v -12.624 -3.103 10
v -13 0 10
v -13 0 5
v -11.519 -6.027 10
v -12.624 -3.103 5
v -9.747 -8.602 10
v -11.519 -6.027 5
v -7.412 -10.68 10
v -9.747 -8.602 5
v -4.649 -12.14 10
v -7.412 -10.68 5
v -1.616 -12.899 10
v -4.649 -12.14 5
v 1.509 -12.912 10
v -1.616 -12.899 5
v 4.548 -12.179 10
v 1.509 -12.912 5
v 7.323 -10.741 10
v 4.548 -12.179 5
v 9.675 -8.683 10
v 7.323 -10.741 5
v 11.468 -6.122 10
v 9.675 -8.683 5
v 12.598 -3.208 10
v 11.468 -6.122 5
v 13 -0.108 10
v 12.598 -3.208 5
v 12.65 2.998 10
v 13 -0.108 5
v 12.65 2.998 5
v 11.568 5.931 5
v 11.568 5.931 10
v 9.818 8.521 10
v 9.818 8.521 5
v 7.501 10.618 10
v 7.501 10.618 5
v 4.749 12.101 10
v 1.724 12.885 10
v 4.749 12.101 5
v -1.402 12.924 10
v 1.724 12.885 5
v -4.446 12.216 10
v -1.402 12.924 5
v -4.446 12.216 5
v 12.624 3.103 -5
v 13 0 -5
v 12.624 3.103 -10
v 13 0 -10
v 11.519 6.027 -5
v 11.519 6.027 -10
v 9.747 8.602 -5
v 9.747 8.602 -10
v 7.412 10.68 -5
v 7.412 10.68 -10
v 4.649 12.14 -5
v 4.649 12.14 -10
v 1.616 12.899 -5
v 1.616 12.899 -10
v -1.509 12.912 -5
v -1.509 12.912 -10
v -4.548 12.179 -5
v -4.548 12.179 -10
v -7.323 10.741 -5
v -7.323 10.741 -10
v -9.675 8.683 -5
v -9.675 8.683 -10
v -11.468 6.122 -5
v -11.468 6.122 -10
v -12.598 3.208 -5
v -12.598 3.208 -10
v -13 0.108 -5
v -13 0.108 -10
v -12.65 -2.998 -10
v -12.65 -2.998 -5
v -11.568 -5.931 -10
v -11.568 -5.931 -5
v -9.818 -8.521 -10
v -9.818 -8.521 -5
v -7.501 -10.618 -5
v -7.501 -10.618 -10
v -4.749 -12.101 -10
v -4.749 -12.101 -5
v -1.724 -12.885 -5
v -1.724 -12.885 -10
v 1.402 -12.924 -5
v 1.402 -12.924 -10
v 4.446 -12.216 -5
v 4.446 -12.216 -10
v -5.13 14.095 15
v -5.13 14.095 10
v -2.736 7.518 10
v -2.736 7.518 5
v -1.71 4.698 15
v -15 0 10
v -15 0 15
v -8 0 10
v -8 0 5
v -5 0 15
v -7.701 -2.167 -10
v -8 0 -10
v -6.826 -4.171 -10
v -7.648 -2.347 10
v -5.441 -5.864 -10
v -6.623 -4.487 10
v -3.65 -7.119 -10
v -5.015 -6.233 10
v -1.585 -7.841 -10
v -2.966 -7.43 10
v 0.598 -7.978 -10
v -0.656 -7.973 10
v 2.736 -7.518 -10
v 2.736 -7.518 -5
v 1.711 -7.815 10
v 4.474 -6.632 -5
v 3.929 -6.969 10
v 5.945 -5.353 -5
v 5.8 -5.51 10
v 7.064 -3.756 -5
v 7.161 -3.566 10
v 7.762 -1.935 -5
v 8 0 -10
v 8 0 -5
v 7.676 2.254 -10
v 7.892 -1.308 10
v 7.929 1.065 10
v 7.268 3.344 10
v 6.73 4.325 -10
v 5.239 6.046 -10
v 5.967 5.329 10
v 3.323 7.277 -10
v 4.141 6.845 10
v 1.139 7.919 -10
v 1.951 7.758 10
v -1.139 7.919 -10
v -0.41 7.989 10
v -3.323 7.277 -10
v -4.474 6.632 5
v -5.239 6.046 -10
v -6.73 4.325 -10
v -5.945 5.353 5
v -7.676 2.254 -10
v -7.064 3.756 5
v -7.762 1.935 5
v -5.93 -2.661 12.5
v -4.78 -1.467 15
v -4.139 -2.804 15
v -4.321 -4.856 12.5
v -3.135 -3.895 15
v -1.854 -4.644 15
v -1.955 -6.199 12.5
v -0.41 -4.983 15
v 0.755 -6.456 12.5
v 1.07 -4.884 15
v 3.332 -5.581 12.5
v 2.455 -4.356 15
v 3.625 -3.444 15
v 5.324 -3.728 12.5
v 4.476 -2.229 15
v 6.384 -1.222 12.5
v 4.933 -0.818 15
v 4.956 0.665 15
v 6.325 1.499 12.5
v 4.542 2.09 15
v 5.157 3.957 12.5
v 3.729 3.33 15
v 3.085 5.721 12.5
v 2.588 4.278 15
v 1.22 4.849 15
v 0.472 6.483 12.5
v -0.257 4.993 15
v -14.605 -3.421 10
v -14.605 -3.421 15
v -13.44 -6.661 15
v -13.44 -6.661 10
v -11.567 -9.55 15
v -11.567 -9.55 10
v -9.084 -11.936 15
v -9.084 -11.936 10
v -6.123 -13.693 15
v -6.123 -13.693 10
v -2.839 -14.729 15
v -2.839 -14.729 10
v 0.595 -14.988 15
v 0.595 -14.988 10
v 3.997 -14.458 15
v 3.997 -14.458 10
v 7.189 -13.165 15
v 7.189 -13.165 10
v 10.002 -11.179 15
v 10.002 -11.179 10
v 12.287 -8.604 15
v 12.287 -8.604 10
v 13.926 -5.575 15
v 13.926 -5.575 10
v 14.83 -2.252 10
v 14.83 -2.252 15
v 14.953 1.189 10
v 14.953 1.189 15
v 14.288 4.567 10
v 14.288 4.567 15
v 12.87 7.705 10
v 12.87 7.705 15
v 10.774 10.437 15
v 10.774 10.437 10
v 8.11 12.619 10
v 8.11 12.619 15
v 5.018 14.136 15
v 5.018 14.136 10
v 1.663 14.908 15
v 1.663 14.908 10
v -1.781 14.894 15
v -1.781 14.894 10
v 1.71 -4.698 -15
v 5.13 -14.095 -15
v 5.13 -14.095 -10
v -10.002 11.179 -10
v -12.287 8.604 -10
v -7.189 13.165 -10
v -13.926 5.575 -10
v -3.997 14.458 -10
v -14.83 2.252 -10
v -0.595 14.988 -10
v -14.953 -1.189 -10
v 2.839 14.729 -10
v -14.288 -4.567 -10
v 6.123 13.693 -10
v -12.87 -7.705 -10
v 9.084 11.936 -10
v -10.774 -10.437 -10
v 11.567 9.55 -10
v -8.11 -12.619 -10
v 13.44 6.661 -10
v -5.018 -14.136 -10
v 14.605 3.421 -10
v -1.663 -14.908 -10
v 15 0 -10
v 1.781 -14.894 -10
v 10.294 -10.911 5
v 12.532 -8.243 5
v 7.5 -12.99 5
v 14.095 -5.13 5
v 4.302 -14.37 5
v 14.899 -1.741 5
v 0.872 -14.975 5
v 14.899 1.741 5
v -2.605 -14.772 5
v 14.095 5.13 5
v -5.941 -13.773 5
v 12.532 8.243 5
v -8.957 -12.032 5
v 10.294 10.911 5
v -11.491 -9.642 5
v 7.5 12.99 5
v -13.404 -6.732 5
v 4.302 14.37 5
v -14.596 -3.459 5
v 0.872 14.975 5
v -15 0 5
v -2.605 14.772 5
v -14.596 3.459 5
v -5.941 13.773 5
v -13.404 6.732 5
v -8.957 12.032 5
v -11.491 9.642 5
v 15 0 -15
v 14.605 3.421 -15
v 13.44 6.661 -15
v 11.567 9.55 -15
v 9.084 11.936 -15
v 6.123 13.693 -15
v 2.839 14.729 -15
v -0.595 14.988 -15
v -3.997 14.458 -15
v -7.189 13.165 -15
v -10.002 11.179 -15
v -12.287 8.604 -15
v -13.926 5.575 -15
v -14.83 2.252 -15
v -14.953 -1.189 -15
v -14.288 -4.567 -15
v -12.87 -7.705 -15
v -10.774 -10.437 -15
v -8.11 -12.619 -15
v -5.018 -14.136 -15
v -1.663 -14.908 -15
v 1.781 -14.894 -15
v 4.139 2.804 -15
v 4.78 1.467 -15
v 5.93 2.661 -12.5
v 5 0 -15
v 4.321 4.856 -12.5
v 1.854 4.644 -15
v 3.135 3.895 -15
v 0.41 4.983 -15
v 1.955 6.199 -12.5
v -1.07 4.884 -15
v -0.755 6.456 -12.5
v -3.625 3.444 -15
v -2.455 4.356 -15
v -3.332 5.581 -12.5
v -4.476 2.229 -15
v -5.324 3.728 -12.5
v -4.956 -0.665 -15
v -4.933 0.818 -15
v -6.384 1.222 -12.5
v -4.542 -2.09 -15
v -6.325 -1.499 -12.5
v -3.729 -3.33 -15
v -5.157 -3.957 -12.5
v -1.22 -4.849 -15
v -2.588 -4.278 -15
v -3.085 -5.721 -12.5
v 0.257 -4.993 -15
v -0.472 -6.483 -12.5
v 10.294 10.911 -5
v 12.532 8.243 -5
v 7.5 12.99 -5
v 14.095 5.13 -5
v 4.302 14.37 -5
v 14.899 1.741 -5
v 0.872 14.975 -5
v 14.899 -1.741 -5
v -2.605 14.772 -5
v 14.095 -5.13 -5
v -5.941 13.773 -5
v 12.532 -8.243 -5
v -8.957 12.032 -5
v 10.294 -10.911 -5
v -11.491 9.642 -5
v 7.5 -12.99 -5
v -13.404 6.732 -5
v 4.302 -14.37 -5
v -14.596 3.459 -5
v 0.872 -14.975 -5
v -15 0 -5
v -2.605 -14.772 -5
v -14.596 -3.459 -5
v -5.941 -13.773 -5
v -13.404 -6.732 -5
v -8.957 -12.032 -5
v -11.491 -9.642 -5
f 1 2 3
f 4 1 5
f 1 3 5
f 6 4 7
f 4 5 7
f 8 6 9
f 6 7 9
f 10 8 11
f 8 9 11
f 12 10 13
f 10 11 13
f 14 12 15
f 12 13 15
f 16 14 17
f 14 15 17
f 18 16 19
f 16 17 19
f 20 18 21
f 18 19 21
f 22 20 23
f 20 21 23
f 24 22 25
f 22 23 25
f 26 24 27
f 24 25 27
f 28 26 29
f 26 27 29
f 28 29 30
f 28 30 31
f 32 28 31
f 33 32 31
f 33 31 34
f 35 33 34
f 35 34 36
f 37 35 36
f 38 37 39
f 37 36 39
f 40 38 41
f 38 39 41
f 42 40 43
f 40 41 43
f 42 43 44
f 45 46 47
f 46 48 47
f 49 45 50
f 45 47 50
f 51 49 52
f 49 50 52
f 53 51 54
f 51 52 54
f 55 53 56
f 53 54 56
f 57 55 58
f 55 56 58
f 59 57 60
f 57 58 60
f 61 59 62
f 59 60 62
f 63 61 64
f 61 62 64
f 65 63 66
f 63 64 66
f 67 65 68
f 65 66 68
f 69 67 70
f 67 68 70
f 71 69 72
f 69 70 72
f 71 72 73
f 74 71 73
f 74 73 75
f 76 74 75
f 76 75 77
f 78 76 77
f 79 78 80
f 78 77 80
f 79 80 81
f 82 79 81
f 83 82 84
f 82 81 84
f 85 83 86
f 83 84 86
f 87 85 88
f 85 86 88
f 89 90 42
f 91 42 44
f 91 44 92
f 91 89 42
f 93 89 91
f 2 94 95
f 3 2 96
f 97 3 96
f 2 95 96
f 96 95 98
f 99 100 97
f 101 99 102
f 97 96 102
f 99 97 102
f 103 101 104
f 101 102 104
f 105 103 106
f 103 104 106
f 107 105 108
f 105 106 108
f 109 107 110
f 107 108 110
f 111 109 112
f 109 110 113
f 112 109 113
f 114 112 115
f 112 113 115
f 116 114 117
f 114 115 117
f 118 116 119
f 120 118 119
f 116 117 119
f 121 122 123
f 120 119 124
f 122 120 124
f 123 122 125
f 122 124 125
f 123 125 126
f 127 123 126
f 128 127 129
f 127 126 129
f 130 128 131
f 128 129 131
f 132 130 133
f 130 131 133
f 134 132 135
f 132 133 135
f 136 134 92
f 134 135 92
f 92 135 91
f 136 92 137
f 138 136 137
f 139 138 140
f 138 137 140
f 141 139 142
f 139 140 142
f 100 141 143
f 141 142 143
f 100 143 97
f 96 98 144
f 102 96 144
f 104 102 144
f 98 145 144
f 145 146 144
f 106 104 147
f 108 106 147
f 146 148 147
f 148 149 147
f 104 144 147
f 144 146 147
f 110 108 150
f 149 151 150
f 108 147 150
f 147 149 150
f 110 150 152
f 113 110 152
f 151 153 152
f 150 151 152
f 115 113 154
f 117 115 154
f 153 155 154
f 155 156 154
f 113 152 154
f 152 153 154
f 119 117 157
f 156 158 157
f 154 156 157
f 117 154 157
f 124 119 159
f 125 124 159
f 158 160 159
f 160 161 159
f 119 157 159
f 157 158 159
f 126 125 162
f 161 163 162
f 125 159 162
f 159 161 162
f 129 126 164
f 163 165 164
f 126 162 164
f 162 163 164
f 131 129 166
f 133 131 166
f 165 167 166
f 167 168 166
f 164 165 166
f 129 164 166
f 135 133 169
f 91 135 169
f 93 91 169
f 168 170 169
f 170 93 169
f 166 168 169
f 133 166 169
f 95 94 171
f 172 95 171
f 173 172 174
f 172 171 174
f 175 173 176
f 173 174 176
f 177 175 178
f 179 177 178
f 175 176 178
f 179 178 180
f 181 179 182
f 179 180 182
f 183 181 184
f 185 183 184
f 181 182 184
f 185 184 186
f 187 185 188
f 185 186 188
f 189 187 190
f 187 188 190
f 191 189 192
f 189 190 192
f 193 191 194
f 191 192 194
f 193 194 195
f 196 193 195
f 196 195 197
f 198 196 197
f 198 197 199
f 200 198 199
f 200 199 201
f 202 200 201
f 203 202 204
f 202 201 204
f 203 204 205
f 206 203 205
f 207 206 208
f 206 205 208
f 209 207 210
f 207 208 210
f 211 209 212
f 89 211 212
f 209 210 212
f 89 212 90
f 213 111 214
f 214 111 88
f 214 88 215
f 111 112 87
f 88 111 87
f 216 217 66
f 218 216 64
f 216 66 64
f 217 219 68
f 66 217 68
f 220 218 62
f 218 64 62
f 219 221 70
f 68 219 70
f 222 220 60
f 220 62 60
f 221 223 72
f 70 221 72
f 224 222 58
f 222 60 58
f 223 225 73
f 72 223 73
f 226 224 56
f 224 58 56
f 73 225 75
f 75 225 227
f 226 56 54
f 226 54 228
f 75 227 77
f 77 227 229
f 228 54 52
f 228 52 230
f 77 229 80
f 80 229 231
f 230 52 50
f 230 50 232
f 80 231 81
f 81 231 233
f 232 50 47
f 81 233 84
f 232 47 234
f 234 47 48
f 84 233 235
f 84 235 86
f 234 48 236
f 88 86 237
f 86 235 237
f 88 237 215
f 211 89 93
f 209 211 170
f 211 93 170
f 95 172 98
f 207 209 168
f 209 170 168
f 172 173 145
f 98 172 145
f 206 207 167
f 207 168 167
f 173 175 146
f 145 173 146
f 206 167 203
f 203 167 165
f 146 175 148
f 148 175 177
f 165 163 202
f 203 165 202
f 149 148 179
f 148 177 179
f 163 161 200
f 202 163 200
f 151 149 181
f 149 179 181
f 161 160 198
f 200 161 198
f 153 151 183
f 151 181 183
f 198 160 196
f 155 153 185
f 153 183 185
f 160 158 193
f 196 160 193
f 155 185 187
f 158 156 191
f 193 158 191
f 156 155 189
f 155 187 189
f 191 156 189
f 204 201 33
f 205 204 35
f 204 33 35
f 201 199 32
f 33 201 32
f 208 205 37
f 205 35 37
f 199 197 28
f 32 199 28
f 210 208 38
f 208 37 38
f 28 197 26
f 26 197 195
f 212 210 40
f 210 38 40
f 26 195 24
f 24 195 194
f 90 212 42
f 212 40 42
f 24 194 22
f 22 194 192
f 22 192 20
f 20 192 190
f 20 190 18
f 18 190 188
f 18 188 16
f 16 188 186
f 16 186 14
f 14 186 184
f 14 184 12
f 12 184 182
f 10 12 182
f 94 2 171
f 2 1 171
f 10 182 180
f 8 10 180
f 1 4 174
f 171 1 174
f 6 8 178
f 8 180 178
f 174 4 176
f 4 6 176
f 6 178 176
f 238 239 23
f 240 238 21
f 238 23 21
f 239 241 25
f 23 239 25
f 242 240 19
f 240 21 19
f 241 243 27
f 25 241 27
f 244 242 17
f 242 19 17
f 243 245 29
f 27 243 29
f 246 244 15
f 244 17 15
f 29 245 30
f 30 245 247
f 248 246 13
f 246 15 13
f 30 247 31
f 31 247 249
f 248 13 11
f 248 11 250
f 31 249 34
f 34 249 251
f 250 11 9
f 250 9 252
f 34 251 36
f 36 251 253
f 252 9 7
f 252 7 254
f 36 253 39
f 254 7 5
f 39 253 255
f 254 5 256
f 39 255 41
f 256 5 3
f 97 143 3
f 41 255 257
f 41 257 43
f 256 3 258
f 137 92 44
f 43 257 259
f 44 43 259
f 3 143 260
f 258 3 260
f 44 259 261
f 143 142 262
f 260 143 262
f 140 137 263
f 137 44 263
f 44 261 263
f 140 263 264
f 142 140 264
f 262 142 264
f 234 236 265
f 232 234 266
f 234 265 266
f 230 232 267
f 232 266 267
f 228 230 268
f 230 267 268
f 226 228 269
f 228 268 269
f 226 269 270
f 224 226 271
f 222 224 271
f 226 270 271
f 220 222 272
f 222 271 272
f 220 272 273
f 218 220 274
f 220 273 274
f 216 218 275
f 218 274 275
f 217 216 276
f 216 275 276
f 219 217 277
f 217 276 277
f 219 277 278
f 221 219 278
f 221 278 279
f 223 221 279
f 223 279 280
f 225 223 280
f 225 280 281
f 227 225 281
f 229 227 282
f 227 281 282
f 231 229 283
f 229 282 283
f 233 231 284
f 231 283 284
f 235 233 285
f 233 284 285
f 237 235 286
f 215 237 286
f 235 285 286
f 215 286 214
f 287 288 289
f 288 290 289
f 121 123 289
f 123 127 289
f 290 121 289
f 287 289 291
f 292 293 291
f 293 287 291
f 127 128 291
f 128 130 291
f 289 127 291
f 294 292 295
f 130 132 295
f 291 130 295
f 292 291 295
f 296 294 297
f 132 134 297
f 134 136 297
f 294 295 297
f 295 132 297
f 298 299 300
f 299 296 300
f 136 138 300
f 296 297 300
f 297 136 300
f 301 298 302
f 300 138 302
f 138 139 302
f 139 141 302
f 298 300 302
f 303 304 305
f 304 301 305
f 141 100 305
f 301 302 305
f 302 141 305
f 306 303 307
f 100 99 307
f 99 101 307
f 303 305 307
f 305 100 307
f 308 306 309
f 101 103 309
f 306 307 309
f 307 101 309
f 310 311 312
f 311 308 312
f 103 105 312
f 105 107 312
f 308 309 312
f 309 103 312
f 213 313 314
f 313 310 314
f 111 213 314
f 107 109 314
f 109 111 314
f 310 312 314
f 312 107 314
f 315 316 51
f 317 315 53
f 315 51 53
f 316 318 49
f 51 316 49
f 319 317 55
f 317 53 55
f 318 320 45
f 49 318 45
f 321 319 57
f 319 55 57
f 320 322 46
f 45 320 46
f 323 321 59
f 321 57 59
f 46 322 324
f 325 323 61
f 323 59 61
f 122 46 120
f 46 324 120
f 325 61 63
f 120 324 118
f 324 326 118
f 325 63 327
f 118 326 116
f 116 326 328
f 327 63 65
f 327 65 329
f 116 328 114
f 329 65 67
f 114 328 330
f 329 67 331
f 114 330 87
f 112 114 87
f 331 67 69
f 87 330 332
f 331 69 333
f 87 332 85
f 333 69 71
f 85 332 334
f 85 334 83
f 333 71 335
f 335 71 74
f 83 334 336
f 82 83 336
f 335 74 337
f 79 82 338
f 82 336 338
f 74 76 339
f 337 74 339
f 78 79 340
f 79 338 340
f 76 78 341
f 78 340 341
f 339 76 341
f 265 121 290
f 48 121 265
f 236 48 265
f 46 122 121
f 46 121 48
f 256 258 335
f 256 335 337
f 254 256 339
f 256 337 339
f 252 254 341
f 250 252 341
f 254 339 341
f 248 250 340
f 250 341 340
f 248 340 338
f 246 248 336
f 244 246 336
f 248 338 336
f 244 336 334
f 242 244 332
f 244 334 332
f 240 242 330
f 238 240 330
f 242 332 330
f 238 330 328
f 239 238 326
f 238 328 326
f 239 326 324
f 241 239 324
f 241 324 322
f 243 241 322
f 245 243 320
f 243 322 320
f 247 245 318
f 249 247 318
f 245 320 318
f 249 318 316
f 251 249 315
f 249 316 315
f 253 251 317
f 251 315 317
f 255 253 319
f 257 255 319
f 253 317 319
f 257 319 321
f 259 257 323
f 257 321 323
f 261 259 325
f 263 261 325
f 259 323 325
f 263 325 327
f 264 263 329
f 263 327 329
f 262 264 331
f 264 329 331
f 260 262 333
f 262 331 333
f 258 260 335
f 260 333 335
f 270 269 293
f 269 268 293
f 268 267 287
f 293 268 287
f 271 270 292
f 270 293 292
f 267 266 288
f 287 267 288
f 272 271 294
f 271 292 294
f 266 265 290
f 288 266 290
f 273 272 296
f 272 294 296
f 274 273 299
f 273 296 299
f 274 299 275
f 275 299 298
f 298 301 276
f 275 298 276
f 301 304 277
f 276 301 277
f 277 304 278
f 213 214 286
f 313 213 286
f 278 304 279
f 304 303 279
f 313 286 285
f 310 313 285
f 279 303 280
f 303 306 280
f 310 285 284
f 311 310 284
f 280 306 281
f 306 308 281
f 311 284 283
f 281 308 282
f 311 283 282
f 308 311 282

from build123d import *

# Parameters (mm, degrees)
SKETCH001_W  = 16
SKETCH001_H  = 16
GROOVE_ANGLE = -70


with BuildPart() as part:
    # Sketch (on XZ_Plane of Origin) → Revolution (revolve)
    with BuildSketch(Plane.XZ):
        Polygon((-5, 15), (-15, 15), (-15, 10), (-13, 10), (-13, 5), (-15, 5), (-15, -5), (-13, -5), (-13, -10), (-15, -10), (-15, -15), (-5, -15), (-8, -10), (-8, 10), align=None)
    revolve(axis=Axis((0, 0, 0), (0, 0, 1)))

    # Sketch001 (on XZ_Plane of Origin) → Groove (revolve, cut)
    with BuildSketch(Plane.XZ):
        with Locations((-8, 13)):
            Rectangle(SKETCH001_W, SKETCH001_H)
        with Locations((8, -13)):
            Rectangle(SKETCH001_W, SKETCH001_H)
    revolve(axis=Axis((0, 0, 0), (0, 0, 1)), revolution_arc=GROOVE_ANGLE, mode=Mode.SUBTRACT)


solid = part.part
